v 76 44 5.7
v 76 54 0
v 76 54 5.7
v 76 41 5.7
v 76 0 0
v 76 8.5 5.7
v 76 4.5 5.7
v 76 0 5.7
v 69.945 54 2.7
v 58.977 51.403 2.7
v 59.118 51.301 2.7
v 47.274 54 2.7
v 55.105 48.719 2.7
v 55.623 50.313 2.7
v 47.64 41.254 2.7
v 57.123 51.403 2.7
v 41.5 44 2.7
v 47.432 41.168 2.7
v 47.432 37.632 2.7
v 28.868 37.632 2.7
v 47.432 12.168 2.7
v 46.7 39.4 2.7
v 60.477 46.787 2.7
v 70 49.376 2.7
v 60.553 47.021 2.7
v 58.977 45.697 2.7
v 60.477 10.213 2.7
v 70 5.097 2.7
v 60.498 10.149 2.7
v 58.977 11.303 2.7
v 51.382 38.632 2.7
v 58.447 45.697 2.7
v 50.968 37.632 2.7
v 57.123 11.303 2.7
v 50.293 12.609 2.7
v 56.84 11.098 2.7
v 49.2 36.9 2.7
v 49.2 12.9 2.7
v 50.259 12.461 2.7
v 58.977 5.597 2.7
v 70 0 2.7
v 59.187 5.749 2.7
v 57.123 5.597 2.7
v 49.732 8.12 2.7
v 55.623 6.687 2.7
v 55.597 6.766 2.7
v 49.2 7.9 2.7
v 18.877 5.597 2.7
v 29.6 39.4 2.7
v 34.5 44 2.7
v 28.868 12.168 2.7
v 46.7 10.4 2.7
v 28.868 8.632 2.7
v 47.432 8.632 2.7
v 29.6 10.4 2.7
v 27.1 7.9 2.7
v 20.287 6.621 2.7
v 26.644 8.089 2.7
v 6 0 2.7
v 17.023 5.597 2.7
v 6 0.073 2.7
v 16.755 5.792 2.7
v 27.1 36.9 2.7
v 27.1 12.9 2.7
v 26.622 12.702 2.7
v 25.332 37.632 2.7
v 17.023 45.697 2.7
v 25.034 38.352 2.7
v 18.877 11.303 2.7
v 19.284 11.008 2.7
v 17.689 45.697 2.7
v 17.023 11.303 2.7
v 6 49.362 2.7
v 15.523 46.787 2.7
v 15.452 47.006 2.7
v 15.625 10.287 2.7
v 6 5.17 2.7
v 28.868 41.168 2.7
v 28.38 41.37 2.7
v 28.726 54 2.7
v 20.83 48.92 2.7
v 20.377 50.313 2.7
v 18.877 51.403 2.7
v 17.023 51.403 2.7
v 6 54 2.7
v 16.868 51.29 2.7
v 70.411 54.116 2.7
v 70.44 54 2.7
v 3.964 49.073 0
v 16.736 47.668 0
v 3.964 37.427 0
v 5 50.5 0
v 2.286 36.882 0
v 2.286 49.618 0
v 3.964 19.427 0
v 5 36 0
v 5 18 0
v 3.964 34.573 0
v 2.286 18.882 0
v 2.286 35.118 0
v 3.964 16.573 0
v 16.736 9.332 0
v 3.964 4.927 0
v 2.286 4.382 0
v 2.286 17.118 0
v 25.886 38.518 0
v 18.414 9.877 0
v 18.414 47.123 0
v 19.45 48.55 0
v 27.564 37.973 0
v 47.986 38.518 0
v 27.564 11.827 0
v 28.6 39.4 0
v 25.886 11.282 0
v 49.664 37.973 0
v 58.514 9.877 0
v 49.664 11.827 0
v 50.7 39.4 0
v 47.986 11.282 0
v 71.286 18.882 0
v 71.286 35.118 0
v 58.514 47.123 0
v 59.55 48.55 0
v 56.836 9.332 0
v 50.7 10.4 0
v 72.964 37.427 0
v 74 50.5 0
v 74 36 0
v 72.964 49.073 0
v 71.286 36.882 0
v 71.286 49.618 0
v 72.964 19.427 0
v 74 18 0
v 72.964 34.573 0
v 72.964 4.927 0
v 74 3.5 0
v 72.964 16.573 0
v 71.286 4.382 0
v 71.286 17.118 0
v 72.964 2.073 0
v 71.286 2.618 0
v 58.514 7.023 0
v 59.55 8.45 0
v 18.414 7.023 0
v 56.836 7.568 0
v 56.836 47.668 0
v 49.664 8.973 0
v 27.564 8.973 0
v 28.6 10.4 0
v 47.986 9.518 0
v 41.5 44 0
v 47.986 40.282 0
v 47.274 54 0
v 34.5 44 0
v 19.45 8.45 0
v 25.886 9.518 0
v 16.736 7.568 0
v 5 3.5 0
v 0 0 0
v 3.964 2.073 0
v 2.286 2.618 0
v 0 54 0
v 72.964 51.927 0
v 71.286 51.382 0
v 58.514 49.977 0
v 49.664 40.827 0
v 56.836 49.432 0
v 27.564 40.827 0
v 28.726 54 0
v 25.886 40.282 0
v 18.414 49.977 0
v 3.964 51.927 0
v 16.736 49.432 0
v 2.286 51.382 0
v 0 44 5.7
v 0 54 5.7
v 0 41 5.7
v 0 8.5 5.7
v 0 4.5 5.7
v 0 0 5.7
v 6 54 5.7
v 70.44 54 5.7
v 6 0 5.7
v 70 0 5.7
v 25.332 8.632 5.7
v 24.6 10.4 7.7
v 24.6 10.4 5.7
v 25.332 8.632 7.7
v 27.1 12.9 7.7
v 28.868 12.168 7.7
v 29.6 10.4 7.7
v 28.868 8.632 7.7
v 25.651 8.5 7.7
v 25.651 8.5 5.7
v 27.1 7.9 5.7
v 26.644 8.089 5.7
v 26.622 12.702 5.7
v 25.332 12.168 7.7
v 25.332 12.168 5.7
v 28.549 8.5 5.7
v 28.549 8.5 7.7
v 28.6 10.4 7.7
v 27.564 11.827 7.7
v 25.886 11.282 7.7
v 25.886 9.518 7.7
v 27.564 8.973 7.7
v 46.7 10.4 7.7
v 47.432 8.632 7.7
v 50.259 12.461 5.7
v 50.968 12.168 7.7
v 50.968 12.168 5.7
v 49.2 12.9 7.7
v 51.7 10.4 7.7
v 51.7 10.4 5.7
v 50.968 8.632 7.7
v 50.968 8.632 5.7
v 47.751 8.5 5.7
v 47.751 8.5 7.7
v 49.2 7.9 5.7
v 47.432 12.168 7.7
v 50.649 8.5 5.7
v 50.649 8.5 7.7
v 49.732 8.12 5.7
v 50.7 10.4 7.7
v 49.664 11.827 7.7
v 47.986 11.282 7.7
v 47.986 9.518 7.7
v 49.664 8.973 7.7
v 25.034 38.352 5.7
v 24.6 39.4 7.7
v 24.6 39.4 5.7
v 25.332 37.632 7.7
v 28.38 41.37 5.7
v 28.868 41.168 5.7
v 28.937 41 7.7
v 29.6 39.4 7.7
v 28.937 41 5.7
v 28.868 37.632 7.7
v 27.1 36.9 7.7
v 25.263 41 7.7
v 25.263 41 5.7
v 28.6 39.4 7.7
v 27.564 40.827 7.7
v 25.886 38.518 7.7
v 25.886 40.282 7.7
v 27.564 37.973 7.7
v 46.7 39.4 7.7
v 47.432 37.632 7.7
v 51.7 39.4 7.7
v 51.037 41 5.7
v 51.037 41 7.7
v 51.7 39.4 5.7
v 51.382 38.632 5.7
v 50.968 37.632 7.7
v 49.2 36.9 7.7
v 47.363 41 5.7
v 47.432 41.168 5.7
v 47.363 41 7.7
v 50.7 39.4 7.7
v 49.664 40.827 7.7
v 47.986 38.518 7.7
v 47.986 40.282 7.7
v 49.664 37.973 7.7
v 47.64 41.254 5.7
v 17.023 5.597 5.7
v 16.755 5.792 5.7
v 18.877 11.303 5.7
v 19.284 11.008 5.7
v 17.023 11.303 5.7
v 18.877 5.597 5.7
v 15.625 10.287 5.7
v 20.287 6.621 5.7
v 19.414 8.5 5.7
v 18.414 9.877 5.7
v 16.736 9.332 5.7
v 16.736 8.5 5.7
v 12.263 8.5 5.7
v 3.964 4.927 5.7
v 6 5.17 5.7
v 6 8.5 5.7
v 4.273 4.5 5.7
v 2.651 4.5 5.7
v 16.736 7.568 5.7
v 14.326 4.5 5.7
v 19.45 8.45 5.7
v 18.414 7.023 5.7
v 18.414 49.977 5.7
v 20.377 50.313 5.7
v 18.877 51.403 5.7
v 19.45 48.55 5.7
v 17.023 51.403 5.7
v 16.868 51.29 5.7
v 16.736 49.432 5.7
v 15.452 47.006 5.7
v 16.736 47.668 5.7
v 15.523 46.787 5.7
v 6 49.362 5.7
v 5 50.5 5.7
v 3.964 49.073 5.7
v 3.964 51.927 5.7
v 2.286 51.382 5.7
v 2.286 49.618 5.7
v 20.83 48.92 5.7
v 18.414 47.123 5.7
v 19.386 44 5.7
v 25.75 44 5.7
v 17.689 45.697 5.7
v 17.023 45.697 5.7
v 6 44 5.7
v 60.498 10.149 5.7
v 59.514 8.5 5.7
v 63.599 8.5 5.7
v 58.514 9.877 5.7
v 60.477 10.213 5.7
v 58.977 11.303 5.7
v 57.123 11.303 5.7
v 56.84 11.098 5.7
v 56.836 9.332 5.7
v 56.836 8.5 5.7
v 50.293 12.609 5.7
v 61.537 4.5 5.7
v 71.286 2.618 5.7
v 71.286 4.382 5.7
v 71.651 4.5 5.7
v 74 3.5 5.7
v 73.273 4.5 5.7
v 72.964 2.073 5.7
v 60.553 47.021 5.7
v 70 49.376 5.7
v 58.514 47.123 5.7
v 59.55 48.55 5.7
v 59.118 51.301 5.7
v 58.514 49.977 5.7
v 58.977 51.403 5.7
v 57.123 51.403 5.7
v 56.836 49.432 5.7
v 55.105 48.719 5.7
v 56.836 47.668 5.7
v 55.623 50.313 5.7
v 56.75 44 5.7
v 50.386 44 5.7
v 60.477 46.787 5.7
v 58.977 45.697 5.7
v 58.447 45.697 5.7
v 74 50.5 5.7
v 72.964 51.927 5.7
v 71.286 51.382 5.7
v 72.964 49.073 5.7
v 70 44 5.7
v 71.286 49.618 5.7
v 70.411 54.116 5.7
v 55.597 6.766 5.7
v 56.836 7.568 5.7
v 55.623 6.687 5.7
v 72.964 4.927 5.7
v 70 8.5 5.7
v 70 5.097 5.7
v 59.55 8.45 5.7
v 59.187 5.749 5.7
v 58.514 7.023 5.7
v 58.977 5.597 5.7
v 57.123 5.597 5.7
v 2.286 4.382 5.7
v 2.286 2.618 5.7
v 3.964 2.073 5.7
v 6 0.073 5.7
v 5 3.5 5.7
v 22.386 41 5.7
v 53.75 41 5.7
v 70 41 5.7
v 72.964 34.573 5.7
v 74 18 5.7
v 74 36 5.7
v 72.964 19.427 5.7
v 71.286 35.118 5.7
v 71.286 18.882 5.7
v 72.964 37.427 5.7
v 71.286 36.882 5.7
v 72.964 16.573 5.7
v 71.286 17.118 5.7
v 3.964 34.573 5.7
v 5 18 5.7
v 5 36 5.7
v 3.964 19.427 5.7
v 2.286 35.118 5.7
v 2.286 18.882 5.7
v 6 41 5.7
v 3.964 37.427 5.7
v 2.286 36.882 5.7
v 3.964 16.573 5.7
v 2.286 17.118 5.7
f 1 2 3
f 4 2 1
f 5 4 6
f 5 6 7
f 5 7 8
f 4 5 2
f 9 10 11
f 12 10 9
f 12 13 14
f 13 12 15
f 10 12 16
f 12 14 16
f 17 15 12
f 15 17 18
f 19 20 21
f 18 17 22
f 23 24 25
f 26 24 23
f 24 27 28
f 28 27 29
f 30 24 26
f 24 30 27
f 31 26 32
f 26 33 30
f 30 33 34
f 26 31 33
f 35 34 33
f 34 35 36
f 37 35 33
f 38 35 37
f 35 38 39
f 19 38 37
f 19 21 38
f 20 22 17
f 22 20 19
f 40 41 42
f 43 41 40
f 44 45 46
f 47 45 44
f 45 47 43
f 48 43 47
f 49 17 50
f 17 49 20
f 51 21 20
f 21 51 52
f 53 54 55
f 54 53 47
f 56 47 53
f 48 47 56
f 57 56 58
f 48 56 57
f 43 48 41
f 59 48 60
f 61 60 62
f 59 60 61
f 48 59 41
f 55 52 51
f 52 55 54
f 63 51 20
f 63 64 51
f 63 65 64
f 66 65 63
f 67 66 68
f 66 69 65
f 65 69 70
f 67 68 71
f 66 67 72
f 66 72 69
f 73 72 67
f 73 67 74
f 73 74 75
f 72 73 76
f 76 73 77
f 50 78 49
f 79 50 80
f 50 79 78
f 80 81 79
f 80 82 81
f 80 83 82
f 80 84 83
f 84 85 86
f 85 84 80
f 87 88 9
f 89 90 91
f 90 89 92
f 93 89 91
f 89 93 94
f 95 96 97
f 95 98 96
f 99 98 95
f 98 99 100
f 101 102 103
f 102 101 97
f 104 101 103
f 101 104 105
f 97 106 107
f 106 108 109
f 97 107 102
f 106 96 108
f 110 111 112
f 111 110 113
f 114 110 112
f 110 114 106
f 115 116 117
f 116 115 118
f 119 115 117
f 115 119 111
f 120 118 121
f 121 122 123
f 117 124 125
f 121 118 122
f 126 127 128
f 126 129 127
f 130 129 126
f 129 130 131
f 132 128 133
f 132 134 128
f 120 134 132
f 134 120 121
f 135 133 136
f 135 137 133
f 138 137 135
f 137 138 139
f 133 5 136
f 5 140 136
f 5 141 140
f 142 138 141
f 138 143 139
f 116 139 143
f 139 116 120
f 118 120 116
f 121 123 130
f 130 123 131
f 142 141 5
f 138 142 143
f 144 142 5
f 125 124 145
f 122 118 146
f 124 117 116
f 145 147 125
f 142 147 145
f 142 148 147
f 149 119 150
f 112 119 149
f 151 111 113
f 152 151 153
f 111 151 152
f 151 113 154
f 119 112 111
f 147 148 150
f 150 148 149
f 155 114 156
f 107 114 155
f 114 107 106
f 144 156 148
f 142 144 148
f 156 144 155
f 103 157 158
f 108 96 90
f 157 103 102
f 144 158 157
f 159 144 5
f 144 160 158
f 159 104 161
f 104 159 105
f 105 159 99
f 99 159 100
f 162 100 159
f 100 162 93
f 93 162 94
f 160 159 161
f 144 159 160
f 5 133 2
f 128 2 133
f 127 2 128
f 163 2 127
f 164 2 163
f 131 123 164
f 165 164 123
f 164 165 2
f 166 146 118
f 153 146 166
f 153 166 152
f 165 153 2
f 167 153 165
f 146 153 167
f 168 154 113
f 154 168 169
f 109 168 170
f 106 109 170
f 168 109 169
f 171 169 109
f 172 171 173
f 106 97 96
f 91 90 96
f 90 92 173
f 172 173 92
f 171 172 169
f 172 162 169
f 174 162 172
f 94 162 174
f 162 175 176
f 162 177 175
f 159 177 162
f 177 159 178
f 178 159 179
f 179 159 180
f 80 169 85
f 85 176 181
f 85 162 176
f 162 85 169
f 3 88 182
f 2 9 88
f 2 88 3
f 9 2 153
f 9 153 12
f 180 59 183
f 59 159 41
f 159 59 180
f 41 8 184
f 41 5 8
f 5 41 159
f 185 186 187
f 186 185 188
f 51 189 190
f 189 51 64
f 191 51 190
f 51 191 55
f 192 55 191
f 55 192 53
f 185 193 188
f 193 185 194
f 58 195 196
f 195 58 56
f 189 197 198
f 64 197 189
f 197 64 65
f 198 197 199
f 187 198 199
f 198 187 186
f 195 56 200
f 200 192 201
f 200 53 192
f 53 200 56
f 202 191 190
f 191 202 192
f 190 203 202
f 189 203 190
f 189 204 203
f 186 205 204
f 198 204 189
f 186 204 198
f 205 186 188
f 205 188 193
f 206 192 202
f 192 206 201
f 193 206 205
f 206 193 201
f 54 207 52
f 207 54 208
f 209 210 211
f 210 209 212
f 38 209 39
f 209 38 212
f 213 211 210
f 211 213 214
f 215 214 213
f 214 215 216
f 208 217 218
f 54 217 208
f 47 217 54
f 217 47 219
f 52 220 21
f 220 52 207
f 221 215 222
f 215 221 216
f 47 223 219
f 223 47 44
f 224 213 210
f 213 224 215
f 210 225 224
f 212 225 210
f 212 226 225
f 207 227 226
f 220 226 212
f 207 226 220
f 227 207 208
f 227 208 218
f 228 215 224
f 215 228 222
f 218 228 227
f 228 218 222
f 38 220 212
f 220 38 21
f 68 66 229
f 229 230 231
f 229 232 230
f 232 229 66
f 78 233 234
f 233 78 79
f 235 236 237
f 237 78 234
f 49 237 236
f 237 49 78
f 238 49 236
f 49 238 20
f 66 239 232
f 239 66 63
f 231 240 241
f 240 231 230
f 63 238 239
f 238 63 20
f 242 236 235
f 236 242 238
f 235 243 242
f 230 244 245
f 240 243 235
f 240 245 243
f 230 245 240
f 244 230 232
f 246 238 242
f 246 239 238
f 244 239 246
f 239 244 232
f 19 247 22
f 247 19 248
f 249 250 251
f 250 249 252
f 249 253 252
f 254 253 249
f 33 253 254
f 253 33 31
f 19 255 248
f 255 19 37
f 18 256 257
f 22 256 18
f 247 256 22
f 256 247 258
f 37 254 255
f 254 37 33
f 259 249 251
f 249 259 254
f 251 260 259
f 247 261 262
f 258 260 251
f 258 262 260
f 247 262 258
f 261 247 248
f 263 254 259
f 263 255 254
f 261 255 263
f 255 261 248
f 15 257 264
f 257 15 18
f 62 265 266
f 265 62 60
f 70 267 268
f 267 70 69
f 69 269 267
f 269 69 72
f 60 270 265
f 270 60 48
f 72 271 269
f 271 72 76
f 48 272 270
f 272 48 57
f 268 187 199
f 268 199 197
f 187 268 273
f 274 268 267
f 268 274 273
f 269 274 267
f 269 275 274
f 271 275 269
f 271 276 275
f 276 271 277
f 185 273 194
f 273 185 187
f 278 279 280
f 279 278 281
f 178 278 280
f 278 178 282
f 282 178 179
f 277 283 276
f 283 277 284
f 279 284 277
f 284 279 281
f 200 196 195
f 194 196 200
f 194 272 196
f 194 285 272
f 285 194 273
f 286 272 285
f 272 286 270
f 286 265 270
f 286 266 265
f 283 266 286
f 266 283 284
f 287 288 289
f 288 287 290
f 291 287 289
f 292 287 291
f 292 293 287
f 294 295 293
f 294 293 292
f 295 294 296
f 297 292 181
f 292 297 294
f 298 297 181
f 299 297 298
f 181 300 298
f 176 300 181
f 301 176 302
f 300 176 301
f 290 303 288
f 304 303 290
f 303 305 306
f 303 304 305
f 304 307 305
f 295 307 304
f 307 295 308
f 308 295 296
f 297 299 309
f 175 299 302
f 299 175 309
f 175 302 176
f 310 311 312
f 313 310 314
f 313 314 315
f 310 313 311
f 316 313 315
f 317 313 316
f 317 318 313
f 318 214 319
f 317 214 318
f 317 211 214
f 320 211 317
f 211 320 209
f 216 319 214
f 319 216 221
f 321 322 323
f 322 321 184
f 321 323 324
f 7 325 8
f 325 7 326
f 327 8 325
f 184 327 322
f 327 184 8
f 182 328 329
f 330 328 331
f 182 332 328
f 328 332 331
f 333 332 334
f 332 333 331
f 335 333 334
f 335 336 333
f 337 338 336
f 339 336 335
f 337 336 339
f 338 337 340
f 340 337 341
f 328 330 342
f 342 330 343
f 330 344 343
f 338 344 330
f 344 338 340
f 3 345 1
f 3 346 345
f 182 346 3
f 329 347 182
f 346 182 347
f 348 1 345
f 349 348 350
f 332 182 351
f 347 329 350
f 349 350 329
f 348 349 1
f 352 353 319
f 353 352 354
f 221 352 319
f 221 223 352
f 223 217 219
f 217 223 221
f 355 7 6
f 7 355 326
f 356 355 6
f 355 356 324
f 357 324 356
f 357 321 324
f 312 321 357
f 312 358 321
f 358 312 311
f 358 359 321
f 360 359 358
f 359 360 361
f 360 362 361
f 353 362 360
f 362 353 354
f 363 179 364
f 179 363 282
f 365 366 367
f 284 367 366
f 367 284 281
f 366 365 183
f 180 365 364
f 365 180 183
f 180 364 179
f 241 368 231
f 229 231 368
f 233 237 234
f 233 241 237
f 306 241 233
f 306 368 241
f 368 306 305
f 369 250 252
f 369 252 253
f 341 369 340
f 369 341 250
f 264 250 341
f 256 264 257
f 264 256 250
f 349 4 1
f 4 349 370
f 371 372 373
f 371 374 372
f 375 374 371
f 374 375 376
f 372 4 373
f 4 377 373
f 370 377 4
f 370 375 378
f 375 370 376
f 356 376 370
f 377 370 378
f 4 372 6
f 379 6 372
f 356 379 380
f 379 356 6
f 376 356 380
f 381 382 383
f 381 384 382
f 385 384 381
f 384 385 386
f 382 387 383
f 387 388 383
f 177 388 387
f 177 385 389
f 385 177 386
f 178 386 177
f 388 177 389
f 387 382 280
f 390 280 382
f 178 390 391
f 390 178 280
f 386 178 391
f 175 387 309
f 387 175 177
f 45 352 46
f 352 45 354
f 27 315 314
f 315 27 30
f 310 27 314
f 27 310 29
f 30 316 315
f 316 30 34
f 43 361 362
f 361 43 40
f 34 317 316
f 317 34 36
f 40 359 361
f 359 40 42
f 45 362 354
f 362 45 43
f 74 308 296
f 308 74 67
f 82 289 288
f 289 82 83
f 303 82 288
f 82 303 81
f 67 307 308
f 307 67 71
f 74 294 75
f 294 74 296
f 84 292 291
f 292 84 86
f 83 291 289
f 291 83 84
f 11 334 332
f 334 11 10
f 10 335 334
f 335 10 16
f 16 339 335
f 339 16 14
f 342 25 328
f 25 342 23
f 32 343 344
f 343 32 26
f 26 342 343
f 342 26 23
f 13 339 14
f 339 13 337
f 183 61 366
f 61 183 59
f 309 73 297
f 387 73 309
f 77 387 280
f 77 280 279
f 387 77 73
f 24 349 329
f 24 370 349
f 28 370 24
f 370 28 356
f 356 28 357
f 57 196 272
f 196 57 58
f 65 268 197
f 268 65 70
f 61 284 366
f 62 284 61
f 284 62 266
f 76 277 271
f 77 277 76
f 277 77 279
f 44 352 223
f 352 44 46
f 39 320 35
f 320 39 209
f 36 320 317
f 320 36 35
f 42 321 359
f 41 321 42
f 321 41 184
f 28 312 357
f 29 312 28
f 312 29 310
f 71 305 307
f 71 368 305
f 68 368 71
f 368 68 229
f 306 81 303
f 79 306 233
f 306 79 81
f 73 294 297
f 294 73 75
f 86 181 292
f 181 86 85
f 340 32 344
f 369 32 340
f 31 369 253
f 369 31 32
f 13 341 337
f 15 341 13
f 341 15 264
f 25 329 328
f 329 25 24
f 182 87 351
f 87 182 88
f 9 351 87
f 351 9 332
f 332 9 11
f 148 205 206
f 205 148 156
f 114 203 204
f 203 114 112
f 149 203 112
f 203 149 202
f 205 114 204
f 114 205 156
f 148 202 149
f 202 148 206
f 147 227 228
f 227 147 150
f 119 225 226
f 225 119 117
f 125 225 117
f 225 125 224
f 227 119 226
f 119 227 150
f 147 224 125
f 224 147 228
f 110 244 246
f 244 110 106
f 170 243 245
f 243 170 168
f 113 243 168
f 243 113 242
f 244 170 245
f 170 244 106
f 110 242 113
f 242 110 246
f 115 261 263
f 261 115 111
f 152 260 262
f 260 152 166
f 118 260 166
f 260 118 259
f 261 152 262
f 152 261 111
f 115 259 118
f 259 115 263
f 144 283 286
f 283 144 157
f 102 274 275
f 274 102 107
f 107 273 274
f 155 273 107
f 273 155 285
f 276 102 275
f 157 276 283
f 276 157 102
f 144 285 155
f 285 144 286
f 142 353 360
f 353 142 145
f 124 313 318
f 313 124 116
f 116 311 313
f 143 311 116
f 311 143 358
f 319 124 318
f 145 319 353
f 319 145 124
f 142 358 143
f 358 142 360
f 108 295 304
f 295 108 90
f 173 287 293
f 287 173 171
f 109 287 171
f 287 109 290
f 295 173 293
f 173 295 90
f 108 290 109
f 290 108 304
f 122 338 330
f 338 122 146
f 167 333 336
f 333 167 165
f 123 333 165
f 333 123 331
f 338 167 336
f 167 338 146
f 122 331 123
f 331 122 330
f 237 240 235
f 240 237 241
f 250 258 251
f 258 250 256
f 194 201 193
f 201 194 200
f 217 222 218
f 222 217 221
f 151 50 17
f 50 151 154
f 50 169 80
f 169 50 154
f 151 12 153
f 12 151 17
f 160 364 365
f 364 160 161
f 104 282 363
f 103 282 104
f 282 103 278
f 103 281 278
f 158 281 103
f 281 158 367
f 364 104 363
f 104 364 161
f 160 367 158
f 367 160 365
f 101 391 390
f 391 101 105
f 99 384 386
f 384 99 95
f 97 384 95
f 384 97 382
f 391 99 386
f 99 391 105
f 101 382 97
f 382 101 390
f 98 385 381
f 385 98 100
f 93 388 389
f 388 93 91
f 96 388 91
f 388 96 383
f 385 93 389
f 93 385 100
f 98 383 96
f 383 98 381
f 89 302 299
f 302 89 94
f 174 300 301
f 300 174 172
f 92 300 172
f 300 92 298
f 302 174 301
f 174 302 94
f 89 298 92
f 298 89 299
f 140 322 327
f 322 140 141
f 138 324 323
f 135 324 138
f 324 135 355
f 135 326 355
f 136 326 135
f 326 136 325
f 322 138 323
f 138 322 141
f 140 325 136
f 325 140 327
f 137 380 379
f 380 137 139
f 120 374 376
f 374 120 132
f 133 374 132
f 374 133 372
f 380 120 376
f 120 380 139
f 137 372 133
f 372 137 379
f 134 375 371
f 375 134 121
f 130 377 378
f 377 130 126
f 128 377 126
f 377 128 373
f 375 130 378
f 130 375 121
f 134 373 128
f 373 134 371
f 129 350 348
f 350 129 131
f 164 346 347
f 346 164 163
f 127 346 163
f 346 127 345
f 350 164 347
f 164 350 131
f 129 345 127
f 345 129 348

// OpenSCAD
// Plate
plateX = 76;
plateY = 54;
plateZThickness = 2.7;

plateXZero = 38;
plateYZero = 28.5;


//RoboPhilo mount variables
//Screw Hole size is to allow screws to pass through without biting
rpScrewHoleSize = 1.5; //really radius

rpXLeft = 26 + 1.1;
rpXRight = 48.1 + 1.1;
rpXMidSpace = 20;

rpYBottom = 9.3 + 1.1;
rpYTop = 38.3 + 1.1;
rpYMidSpace = 27;

rpScrewMountZ = 5;
rpScrewmountDiameter = 2.5;  //really radius

//ezRobot mount variables
//Screw hole size here is to allow #4 screws to bite into it
//You can change the screwhole size and the hole will stay in the same position
ezrScrewHoleSize = 1.5; //really radius
ezrOffset = 17.5 + 2.55; //2.55 is the center of the hole on the ezbv4
ezrScrewMountZ = 3;
ezrScrewMountDiameter = 3; //really radius

difference(){
union(){
// Plate
cube([plateX,plateY,plateZThickness]);

//RoboPhilo screw mounts
//fixed position based on the actual plate
//lower left
color([1,0,0])
translate([rpXLeft,rpYBottom,plateZThickness])
cylinder(rpScrewMountZ,rpScrewmountDiameter,rpScrewmountDiameter);

//lower right
color([1,0,0])
translate([rpXRight,rpYBottom,plateZThickness])
cylinder(rpScrewMountZ,rpScrewmountDiameter,rpScrewmountDiameter);

//upper left
color([1,0,0])
translate([rpXLeft,rpYTop,plateZThickness])
cylinder(rpScrewMountZ,rpScrewmountDiameter,rpScrewmountDiameter);

//upper right
color([1,0,0])
translate([rpXRight,rpYTop,plateZThickness])
cylinder(rpScrewMountZ,rpScrewmountDiameter,rpScrewmountDiameter);

//EZ Robot Screw mounts
//calculated based on the center coordinates of the plate
//lower left
color([0,1,0])
translate([plateXZero-ezrOffset,plateYZero-ezrOffset,plateZThickness])
cylinder(ezrScrewMountZ,ezrScrewMountDiameter,ezrScrewMountDiameter);

//lower right
color([0,1,0])
translate([plateXZero+ezrOffset,plateYZero-ezrOffset,plateZThickness])
cylinder(ezrScrewMountZ,ezrScrewMountDiameter,ezrScrewMountDiameter);

//upper left
color([0,1,0])
translate([plateXZero-ezrOffset,plateYZero+ezrOffset,plateZThickness])
cylinder(ezrScrewMountZ,ezrScrewMountDiameter,ezrScrewMountDiameter);

//upper right
color([0,1,0])
translate([plateXZero+ezrOffset,plateYZero+ezrOffset,plateZThickness])
cylinder(ezrScrewMountZ,ezrScrewMountDiameter,ezrScrewMountDiameter);

//Supports
//Left and Right
color([1,1,1])
translate([0,0,plateZThickness])
cube([6,plateY,ezrScrewMountZ]);

color([1,1,1])
translate([plateX-6,0,plateZThickness])
cube([6,plateY,ezrScrewMountZ]);

//lower left
color([1,1,1])
translate([plateXZero-ezrOffset,plateYZero-ezrOffset+2.25,plateZThickness])
rotate([0,0,-77])
cube([4.5,9,ezrScrewMountZ]);

color([1,1,1])
translate([3.8,4,plateZThickness])
rotate([0,0,-62])
cube([4.5,15,ezrScrewMountZ]);

//lower right
color([1,1,1])
translate([plateXZero+ezrOffset,plateYZero-ezrOffset-2.25,plateZThickness])
rotate([0,0,77])
cube([4.5,9,ezrScrewMountZ]);

color([1,1,1])
translate([plateX+4-6-4,0,plateZThickness])
rotate([0,0,62])
cube([4.5,15,ezrScrewMountZ]);

//upper left
color([1,1,1])
translate([plateXZero-ezrOffset+2.25,plateYZero+ezrOffset+1,plateZThickness])
rotate([0,0,225])
cube([4.5,12,ezrScrewMountZ]);

color([1,1,1])
translate([6,plateY,plateZThickness])
rotate([0,0,-104])
cube([4.5,12,ezrScrewMountZ]);

//upper right
color([1,1,1])
translate([plateXZero+ezrOffset+1,plateYZero+ezrOffset-2.25,plateZThickness])
rotate([0,0,135])
cube([4.5,12,ezrScrewMountZ]);

color([1,1,1])
translate([plateX-4.5,plateY-4.25,plateZThickness])
rotate([0,0,104])
cube([4.5,12,ezrScrewMountZ]);

// 



} //end union() of plate



//mount holes to mount to RoboPhilo
//lower left
color([0,0,1])
translate([rpXLeft,rpYBottom,-1])
cylinder(10,rpScrewHoleSize,rpScrewHoleSize);

//lower right
color([0,0,1])
translate([rpXRight,rpYBottom,-1])
cylinder(10,rpScrewHoleSize,rpScrewHoleSize);

//upper left
color([0,0,1])
translate([rpXLeft,rpYTop,-1])
cylinder(10,rpScrewHoleSize,rpScrewHoleSize);

//upper right
color([0,0,1])
translate([rpXRight,rpYTop,-1])
cylinder(10,rpScrewHoleSize,rpScrewHoleSize);

//EZ Robot Screw holes
//lower left
color([0,0,1])
translate([plateXZero-ezrOffset,plateYZero-ezrOffset, -1])
cylinder(10,ezrScrewHoleSize,ezrScrewHoleSize);

//lower right
color([0,0,1])
translate([plateXZero+ezrOffset,plateYZero-ezrOffset, -1])
cylinder(10,ezrScrewHoleSize,ezrScrewHoleSize);

//upper left
color([0,0,1])
translate([plateXZero-ezrOffset,plateYZero+ezrOffset, -1])
cylinder(10,ezrScrewHoleSize,ezrScrewHoleSize);

//upper right
color([0,0,1])
translate([plateXZero+ezrOffset,plateYZero+ezrOffset, -1])
cylinder(10,ezrScrewHoleSize,ezrScrewHoleSize);

//top Robophilo cutoff
color([1,1,0])
translate([0,plateY-13,plateZThickness+ezrScrewMountZ])
cube([plateX,3,10]);

//bottom Robophilo cutoff
color([1,1,0])
translate([0,4.5,plateZThickness+ezrScrewMountZ])
cube([plateX,4,10]);

//power cutoff
color([1,1,0])
translate([plateX/2-3.5,plateY-10,-1])
cube([7,11,plateZThickness+2]);

color([1,1,1])
translate([plateX/2-3.5,plateY-2,-1])
rotate ([0,0,30])
cylinder(4,8,8,$fn=3);

color([1,1,1])
translate([plateX/2+3.5,plateY-2,-1])
rotate ([0,0,30])
cylinder(4,8,8,$fn=3);

//side holes
//left side
color([0,0,1])
translate([3.5,3.5, -1])
cylinder(10,ezrScrewHoleSize,ezrScrewHoleSize);

color([0,0,1])
translate([3.5,plateY/3, -1])
cylinder(10,ezrScrewHoleSize,ezrScrewHoleSize);

color([0,0,1])
translate([3.5,plateY*2/3, -1])
cylinder(10,ezrScrewHoleSize,ezrScrewHoleSize);

color([0,0,1])
translate([3.5,plateY-3.5, -1])
cylinder(10,ezrScrewHoleSize,ezrScrewHoleSize);

//right side
color([0,0,1])
translate([plateX-3.5,3.5, -1])
cylinder(10,ezrScrewHoleSize,ezrScrewHoleSize);

color([0,0,1])
translate([plateX-3.5,plateY/3, -1])
cylinder(10,ezrScrewHoleSize,ezrScrewHoleSize);

color([0,0,1])
translate([plateX-3.5,plateY*2/3, -1])
cylinder(10,ezrScrewHoleSize,ezrScrewHoleSize);

color([0,0,1])
translate([plateX-3.5,plateY-3.5, -1])
cylinder(10,ezrScrewHoleSize,ezrScrewHoleSize);



} // end difference()
